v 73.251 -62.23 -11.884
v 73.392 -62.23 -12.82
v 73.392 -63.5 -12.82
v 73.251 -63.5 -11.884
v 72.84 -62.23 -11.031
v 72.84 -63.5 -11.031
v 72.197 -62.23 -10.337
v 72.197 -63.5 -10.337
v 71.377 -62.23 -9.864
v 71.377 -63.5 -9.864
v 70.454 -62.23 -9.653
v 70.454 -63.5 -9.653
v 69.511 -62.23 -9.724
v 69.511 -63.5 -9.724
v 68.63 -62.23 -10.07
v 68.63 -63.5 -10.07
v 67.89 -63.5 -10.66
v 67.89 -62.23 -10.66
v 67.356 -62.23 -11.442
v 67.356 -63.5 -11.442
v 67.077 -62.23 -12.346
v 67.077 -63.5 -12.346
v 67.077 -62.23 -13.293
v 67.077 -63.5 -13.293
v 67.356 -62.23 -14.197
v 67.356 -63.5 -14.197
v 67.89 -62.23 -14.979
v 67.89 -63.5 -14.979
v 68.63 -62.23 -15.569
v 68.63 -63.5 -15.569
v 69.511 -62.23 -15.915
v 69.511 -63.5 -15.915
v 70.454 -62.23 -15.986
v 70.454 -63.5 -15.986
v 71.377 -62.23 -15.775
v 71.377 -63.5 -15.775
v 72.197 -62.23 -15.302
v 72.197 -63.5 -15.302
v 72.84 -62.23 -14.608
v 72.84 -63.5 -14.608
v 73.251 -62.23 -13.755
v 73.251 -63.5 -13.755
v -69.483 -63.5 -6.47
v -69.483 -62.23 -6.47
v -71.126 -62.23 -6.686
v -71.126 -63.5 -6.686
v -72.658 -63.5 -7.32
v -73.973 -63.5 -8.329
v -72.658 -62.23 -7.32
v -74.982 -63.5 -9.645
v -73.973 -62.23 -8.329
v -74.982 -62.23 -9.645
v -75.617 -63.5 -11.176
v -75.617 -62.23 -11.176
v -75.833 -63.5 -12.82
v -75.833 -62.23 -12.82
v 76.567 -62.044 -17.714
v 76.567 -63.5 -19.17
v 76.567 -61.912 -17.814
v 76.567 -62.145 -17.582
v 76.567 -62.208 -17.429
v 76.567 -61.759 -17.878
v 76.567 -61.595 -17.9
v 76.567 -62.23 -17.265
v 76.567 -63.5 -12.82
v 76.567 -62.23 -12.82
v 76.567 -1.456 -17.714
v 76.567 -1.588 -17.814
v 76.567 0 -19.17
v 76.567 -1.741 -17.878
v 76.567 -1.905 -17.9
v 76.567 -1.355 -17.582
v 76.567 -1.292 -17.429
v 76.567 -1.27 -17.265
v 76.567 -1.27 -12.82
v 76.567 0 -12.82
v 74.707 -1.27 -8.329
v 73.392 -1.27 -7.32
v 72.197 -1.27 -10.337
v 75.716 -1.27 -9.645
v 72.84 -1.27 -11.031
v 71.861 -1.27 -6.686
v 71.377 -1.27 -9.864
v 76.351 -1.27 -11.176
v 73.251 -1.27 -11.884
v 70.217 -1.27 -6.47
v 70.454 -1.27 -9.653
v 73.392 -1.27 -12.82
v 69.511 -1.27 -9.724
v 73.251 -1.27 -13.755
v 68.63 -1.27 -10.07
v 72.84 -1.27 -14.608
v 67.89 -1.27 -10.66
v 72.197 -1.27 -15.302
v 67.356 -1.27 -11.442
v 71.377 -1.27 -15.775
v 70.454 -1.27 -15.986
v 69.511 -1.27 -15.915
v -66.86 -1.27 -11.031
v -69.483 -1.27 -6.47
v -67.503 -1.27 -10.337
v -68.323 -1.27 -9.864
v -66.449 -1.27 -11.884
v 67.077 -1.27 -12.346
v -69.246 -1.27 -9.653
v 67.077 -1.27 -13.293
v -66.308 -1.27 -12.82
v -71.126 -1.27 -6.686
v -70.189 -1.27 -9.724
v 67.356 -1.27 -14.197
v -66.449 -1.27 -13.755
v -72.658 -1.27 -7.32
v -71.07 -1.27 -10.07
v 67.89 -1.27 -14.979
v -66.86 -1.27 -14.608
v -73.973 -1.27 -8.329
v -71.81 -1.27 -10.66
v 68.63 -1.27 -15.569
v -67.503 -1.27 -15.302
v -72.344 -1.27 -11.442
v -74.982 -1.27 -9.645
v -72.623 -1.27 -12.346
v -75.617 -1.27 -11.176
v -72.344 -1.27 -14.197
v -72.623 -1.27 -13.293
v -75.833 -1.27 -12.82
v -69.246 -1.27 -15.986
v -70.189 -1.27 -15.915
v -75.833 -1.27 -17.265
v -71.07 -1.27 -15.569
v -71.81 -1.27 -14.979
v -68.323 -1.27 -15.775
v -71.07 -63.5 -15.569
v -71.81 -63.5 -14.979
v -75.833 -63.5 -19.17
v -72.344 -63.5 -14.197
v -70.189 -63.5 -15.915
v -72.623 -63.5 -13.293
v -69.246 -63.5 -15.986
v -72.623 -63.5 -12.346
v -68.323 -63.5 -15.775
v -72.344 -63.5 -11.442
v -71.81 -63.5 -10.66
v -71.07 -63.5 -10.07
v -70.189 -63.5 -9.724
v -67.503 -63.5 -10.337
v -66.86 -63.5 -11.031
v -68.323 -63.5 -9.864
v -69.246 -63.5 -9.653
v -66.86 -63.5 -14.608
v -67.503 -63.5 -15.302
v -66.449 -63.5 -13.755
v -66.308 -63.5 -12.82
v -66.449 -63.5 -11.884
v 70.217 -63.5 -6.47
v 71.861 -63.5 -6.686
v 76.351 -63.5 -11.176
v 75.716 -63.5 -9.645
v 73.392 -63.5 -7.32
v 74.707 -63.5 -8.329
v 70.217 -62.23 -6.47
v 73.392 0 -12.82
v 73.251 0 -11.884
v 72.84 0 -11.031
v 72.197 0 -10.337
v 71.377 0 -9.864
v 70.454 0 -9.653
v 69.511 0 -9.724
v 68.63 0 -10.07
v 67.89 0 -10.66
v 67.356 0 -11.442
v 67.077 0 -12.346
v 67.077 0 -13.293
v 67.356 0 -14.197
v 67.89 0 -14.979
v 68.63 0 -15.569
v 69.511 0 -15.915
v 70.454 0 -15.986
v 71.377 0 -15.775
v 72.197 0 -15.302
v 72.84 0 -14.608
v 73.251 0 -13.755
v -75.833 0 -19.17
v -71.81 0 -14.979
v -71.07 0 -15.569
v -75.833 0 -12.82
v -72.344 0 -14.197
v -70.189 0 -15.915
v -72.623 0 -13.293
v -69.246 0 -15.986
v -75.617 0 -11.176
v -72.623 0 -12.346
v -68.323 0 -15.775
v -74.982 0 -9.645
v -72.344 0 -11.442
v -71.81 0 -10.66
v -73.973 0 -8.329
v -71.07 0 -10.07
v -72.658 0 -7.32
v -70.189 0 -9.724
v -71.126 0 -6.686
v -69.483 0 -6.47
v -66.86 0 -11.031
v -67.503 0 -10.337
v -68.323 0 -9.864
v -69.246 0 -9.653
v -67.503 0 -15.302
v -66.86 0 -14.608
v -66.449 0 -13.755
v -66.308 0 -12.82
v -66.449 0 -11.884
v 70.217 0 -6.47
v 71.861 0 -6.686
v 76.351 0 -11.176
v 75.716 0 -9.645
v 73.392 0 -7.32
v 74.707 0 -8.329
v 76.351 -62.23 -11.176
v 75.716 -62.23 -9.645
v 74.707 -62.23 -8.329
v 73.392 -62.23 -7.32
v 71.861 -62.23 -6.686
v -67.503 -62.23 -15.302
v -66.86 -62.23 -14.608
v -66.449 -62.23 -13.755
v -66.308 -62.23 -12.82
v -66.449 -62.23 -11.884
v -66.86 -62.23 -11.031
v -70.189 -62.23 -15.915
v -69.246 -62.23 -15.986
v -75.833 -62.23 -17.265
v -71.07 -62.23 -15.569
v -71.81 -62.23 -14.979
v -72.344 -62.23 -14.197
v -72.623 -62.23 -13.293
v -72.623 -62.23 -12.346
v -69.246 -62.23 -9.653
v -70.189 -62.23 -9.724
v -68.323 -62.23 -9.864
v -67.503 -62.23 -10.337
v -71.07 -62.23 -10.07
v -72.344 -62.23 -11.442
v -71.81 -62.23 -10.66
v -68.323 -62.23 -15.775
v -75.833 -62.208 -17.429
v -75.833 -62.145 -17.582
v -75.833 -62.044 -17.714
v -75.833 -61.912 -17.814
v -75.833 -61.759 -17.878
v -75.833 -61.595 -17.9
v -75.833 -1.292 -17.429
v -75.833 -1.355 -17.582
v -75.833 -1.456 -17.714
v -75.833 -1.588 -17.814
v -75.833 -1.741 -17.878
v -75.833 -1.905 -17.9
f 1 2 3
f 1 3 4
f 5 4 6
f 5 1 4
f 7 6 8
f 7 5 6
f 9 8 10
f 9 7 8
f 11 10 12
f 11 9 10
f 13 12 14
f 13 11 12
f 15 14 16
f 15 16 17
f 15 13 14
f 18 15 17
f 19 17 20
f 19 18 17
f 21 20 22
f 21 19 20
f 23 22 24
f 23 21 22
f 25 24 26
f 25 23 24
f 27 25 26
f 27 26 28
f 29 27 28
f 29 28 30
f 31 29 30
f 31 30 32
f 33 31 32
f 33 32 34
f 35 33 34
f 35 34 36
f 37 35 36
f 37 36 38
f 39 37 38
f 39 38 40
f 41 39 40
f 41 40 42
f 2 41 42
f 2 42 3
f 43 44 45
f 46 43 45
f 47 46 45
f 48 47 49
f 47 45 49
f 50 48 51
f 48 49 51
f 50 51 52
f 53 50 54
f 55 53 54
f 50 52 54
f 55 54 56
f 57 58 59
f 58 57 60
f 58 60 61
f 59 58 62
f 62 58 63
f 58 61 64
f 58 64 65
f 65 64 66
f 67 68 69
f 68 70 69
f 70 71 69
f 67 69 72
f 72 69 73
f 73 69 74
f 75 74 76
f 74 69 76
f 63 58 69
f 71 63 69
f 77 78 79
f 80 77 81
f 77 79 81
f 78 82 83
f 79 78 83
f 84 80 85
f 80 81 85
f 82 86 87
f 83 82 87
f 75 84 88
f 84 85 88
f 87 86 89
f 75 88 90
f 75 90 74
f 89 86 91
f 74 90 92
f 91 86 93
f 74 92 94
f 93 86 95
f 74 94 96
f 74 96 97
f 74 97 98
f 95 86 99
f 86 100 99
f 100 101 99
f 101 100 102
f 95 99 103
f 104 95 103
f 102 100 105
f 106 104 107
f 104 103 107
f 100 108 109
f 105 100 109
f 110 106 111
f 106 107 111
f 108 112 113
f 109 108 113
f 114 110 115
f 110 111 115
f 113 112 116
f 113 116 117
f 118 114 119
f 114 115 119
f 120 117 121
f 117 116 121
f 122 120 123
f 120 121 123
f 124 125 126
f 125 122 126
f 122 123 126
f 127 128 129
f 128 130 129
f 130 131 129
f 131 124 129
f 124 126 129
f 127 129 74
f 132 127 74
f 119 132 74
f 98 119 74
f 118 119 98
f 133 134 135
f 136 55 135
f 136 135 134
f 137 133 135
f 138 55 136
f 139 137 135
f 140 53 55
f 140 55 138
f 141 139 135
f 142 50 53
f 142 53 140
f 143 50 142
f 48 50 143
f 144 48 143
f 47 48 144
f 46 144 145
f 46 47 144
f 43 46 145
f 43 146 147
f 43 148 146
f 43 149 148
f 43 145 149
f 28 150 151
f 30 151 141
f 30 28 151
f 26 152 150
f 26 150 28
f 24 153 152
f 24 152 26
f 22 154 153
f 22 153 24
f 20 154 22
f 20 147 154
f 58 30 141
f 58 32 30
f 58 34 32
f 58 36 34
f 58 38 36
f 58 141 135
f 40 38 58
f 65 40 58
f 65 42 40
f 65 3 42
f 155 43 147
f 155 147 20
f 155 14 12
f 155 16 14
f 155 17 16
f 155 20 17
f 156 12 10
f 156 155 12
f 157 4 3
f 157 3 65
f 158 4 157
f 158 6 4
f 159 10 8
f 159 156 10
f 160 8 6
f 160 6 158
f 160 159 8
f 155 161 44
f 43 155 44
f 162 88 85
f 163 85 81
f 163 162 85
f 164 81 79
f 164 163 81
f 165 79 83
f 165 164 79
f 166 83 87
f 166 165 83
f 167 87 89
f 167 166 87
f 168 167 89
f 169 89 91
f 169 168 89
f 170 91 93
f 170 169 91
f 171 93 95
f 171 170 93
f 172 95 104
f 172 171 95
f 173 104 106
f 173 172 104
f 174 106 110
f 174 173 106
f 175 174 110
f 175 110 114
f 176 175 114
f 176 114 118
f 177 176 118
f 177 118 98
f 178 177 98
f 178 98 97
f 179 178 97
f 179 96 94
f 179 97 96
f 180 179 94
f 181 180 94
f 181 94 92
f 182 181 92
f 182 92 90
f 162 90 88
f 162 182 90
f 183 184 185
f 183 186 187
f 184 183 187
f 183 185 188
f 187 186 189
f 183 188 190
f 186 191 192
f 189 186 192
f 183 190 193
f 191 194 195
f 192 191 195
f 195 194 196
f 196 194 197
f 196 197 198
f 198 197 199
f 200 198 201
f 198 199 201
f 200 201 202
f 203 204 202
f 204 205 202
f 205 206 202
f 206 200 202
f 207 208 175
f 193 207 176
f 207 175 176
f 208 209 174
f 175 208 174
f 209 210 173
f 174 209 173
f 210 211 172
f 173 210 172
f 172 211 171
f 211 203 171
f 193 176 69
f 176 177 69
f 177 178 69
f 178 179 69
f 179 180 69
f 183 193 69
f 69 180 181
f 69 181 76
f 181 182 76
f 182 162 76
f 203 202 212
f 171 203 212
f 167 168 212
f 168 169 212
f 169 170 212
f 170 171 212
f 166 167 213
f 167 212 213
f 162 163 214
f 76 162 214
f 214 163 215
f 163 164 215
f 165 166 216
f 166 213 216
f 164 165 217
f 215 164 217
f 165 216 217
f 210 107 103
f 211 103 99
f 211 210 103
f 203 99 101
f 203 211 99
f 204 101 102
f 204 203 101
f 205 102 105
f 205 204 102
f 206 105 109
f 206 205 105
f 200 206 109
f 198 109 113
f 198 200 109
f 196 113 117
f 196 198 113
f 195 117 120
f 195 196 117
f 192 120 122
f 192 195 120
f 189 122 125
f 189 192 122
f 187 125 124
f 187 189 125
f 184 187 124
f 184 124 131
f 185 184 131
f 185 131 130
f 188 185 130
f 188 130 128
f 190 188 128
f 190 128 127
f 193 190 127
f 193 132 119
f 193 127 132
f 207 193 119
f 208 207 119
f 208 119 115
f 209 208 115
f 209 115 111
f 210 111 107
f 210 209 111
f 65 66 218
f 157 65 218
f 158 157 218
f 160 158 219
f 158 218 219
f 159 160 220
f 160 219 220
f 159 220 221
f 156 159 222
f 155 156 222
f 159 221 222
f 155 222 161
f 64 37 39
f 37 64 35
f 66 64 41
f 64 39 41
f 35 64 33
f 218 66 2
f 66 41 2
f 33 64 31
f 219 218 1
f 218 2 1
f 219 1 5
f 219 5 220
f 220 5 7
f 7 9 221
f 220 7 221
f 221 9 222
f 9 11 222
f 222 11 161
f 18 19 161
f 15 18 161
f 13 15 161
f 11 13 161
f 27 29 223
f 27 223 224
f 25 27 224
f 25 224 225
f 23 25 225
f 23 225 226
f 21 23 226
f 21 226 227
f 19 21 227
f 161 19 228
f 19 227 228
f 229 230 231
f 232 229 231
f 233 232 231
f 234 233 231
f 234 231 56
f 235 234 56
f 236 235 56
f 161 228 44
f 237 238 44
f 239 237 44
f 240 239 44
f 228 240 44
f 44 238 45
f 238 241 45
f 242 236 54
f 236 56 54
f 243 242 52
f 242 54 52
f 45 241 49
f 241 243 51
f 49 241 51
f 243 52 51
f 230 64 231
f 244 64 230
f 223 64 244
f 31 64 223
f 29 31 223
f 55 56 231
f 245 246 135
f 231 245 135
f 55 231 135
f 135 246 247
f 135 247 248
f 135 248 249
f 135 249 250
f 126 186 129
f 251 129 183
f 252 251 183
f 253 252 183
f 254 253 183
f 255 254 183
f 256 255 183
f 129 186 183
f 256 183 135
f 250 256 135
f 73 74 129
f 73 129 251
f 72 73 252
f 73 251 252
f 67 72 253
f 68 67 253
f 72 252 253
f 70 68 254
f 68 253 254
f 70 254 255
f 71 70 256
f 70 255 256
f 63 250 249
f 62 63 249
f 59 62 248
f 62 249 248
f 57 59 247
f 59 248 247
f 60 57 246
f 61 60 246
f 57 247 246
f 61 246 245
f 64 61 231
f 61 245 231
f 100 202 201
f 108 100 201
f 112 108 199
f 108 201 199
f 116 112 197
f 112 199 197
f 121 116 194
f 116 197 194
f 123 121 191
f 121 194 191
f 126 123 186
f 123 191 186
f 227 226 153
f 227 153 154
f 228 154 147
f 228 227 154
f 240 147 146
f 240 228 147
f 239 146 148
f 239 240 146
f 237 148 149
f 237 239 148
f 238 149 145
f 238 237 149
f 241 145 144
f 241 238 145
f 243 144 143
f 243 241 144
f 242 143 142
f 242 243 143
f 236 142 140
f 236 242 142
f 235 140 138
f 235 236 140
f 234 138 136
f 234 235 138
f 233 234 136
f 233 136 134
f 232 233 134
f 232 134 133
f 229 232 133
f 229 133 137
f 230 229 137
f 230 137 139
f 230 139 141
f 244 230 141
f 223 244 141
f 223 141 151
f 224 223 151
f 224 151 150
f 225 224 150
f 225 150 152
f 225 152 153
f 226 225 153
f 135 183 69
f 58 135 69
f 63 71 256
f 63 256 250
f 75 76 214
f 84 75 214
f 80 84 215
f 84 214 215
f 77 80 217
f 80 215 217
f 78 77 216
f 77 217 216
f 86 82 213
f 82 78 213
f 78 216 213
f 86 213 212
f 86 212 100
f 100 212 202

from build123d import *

# Parameters (mm, degrees)
F0_R     = 3.175
F1_DEPTH = 63.5
F2_W     = 60.96
F2_H     = 21.8726252659
F3_DEPTH = 152.401


with BuildPart() as f1:
    # F0 (on Front) → F1 (new body)
    with BuildSketch(Plane.XZ):
        with BuildLine():
            Line((70.2170193255, -6.4695058077), (-69.4829806745, -6.4695058077))
            ThreePointArc((-69.4829806745, -6.4695058077), (-73.973108735, -8.3293777471), (-75.8329806745, -12.8195058077))
            Line((-75.8329806745, -12.8195058077), (-75.8329806745, -19.1695058077))
            Line((-75.8329806745, -19.1695058077), (76.5670193255, -19.1695058077))
            Line((76.5670193255, -19.1695058077), (76.5670193255, -12.8195058077))
            ThreePointArc((76.5670193255, -12.8195058077), (74.707147386, -8.3293777471), (70.2170193255, -6.4695058077))
        make_face()
        with Locations((-69.4829806745, -12.8195058077)):
            Circle(F0_R, mode=Mode.SUBTRACT)
        with Locations((70.2170193255, -12.8195058077)):
            Circle(F0_R, mode=Mode.SUBTRACT)
    extrude(amount=F1_DEPTH)

    # F2 (on face) → F3 (cut, through all)
    with BuildSketch(Plane(origin=(-75.8329806745, 0, 0), x_dir=(0, -1, 0), z_dir=(-1, 0, 0))):
        with Locations((31.75, -1.8831931747)):
            Rectangle(F2_W, F2_H)
        with BuildLine():
            Line((62.23, -12.8195058077), (1.27, -12.8195058077))
            Line((1.27, -12.8195058077), (1.27, -17.2645058077))
            ThreePointArc((1.27, -17.2645058077), (1.4559871939, -17.7135186137), (1.905, -17.8995058077))
            Line((1.905, -17.8995058077), (61.595, -17.8995058077))
            ThreePointArc((61.595, -17.8995058077), (62.0440128061, -17.7135186137), (62.23, -17.2645058077))
            Line((62.23, -17.2645058077), (62.23, -12.8195058077))
        make_face()
    extrude(amount=-F3_DEPTH, mode=Mode.SUBTRACT)


solid = f1.part
